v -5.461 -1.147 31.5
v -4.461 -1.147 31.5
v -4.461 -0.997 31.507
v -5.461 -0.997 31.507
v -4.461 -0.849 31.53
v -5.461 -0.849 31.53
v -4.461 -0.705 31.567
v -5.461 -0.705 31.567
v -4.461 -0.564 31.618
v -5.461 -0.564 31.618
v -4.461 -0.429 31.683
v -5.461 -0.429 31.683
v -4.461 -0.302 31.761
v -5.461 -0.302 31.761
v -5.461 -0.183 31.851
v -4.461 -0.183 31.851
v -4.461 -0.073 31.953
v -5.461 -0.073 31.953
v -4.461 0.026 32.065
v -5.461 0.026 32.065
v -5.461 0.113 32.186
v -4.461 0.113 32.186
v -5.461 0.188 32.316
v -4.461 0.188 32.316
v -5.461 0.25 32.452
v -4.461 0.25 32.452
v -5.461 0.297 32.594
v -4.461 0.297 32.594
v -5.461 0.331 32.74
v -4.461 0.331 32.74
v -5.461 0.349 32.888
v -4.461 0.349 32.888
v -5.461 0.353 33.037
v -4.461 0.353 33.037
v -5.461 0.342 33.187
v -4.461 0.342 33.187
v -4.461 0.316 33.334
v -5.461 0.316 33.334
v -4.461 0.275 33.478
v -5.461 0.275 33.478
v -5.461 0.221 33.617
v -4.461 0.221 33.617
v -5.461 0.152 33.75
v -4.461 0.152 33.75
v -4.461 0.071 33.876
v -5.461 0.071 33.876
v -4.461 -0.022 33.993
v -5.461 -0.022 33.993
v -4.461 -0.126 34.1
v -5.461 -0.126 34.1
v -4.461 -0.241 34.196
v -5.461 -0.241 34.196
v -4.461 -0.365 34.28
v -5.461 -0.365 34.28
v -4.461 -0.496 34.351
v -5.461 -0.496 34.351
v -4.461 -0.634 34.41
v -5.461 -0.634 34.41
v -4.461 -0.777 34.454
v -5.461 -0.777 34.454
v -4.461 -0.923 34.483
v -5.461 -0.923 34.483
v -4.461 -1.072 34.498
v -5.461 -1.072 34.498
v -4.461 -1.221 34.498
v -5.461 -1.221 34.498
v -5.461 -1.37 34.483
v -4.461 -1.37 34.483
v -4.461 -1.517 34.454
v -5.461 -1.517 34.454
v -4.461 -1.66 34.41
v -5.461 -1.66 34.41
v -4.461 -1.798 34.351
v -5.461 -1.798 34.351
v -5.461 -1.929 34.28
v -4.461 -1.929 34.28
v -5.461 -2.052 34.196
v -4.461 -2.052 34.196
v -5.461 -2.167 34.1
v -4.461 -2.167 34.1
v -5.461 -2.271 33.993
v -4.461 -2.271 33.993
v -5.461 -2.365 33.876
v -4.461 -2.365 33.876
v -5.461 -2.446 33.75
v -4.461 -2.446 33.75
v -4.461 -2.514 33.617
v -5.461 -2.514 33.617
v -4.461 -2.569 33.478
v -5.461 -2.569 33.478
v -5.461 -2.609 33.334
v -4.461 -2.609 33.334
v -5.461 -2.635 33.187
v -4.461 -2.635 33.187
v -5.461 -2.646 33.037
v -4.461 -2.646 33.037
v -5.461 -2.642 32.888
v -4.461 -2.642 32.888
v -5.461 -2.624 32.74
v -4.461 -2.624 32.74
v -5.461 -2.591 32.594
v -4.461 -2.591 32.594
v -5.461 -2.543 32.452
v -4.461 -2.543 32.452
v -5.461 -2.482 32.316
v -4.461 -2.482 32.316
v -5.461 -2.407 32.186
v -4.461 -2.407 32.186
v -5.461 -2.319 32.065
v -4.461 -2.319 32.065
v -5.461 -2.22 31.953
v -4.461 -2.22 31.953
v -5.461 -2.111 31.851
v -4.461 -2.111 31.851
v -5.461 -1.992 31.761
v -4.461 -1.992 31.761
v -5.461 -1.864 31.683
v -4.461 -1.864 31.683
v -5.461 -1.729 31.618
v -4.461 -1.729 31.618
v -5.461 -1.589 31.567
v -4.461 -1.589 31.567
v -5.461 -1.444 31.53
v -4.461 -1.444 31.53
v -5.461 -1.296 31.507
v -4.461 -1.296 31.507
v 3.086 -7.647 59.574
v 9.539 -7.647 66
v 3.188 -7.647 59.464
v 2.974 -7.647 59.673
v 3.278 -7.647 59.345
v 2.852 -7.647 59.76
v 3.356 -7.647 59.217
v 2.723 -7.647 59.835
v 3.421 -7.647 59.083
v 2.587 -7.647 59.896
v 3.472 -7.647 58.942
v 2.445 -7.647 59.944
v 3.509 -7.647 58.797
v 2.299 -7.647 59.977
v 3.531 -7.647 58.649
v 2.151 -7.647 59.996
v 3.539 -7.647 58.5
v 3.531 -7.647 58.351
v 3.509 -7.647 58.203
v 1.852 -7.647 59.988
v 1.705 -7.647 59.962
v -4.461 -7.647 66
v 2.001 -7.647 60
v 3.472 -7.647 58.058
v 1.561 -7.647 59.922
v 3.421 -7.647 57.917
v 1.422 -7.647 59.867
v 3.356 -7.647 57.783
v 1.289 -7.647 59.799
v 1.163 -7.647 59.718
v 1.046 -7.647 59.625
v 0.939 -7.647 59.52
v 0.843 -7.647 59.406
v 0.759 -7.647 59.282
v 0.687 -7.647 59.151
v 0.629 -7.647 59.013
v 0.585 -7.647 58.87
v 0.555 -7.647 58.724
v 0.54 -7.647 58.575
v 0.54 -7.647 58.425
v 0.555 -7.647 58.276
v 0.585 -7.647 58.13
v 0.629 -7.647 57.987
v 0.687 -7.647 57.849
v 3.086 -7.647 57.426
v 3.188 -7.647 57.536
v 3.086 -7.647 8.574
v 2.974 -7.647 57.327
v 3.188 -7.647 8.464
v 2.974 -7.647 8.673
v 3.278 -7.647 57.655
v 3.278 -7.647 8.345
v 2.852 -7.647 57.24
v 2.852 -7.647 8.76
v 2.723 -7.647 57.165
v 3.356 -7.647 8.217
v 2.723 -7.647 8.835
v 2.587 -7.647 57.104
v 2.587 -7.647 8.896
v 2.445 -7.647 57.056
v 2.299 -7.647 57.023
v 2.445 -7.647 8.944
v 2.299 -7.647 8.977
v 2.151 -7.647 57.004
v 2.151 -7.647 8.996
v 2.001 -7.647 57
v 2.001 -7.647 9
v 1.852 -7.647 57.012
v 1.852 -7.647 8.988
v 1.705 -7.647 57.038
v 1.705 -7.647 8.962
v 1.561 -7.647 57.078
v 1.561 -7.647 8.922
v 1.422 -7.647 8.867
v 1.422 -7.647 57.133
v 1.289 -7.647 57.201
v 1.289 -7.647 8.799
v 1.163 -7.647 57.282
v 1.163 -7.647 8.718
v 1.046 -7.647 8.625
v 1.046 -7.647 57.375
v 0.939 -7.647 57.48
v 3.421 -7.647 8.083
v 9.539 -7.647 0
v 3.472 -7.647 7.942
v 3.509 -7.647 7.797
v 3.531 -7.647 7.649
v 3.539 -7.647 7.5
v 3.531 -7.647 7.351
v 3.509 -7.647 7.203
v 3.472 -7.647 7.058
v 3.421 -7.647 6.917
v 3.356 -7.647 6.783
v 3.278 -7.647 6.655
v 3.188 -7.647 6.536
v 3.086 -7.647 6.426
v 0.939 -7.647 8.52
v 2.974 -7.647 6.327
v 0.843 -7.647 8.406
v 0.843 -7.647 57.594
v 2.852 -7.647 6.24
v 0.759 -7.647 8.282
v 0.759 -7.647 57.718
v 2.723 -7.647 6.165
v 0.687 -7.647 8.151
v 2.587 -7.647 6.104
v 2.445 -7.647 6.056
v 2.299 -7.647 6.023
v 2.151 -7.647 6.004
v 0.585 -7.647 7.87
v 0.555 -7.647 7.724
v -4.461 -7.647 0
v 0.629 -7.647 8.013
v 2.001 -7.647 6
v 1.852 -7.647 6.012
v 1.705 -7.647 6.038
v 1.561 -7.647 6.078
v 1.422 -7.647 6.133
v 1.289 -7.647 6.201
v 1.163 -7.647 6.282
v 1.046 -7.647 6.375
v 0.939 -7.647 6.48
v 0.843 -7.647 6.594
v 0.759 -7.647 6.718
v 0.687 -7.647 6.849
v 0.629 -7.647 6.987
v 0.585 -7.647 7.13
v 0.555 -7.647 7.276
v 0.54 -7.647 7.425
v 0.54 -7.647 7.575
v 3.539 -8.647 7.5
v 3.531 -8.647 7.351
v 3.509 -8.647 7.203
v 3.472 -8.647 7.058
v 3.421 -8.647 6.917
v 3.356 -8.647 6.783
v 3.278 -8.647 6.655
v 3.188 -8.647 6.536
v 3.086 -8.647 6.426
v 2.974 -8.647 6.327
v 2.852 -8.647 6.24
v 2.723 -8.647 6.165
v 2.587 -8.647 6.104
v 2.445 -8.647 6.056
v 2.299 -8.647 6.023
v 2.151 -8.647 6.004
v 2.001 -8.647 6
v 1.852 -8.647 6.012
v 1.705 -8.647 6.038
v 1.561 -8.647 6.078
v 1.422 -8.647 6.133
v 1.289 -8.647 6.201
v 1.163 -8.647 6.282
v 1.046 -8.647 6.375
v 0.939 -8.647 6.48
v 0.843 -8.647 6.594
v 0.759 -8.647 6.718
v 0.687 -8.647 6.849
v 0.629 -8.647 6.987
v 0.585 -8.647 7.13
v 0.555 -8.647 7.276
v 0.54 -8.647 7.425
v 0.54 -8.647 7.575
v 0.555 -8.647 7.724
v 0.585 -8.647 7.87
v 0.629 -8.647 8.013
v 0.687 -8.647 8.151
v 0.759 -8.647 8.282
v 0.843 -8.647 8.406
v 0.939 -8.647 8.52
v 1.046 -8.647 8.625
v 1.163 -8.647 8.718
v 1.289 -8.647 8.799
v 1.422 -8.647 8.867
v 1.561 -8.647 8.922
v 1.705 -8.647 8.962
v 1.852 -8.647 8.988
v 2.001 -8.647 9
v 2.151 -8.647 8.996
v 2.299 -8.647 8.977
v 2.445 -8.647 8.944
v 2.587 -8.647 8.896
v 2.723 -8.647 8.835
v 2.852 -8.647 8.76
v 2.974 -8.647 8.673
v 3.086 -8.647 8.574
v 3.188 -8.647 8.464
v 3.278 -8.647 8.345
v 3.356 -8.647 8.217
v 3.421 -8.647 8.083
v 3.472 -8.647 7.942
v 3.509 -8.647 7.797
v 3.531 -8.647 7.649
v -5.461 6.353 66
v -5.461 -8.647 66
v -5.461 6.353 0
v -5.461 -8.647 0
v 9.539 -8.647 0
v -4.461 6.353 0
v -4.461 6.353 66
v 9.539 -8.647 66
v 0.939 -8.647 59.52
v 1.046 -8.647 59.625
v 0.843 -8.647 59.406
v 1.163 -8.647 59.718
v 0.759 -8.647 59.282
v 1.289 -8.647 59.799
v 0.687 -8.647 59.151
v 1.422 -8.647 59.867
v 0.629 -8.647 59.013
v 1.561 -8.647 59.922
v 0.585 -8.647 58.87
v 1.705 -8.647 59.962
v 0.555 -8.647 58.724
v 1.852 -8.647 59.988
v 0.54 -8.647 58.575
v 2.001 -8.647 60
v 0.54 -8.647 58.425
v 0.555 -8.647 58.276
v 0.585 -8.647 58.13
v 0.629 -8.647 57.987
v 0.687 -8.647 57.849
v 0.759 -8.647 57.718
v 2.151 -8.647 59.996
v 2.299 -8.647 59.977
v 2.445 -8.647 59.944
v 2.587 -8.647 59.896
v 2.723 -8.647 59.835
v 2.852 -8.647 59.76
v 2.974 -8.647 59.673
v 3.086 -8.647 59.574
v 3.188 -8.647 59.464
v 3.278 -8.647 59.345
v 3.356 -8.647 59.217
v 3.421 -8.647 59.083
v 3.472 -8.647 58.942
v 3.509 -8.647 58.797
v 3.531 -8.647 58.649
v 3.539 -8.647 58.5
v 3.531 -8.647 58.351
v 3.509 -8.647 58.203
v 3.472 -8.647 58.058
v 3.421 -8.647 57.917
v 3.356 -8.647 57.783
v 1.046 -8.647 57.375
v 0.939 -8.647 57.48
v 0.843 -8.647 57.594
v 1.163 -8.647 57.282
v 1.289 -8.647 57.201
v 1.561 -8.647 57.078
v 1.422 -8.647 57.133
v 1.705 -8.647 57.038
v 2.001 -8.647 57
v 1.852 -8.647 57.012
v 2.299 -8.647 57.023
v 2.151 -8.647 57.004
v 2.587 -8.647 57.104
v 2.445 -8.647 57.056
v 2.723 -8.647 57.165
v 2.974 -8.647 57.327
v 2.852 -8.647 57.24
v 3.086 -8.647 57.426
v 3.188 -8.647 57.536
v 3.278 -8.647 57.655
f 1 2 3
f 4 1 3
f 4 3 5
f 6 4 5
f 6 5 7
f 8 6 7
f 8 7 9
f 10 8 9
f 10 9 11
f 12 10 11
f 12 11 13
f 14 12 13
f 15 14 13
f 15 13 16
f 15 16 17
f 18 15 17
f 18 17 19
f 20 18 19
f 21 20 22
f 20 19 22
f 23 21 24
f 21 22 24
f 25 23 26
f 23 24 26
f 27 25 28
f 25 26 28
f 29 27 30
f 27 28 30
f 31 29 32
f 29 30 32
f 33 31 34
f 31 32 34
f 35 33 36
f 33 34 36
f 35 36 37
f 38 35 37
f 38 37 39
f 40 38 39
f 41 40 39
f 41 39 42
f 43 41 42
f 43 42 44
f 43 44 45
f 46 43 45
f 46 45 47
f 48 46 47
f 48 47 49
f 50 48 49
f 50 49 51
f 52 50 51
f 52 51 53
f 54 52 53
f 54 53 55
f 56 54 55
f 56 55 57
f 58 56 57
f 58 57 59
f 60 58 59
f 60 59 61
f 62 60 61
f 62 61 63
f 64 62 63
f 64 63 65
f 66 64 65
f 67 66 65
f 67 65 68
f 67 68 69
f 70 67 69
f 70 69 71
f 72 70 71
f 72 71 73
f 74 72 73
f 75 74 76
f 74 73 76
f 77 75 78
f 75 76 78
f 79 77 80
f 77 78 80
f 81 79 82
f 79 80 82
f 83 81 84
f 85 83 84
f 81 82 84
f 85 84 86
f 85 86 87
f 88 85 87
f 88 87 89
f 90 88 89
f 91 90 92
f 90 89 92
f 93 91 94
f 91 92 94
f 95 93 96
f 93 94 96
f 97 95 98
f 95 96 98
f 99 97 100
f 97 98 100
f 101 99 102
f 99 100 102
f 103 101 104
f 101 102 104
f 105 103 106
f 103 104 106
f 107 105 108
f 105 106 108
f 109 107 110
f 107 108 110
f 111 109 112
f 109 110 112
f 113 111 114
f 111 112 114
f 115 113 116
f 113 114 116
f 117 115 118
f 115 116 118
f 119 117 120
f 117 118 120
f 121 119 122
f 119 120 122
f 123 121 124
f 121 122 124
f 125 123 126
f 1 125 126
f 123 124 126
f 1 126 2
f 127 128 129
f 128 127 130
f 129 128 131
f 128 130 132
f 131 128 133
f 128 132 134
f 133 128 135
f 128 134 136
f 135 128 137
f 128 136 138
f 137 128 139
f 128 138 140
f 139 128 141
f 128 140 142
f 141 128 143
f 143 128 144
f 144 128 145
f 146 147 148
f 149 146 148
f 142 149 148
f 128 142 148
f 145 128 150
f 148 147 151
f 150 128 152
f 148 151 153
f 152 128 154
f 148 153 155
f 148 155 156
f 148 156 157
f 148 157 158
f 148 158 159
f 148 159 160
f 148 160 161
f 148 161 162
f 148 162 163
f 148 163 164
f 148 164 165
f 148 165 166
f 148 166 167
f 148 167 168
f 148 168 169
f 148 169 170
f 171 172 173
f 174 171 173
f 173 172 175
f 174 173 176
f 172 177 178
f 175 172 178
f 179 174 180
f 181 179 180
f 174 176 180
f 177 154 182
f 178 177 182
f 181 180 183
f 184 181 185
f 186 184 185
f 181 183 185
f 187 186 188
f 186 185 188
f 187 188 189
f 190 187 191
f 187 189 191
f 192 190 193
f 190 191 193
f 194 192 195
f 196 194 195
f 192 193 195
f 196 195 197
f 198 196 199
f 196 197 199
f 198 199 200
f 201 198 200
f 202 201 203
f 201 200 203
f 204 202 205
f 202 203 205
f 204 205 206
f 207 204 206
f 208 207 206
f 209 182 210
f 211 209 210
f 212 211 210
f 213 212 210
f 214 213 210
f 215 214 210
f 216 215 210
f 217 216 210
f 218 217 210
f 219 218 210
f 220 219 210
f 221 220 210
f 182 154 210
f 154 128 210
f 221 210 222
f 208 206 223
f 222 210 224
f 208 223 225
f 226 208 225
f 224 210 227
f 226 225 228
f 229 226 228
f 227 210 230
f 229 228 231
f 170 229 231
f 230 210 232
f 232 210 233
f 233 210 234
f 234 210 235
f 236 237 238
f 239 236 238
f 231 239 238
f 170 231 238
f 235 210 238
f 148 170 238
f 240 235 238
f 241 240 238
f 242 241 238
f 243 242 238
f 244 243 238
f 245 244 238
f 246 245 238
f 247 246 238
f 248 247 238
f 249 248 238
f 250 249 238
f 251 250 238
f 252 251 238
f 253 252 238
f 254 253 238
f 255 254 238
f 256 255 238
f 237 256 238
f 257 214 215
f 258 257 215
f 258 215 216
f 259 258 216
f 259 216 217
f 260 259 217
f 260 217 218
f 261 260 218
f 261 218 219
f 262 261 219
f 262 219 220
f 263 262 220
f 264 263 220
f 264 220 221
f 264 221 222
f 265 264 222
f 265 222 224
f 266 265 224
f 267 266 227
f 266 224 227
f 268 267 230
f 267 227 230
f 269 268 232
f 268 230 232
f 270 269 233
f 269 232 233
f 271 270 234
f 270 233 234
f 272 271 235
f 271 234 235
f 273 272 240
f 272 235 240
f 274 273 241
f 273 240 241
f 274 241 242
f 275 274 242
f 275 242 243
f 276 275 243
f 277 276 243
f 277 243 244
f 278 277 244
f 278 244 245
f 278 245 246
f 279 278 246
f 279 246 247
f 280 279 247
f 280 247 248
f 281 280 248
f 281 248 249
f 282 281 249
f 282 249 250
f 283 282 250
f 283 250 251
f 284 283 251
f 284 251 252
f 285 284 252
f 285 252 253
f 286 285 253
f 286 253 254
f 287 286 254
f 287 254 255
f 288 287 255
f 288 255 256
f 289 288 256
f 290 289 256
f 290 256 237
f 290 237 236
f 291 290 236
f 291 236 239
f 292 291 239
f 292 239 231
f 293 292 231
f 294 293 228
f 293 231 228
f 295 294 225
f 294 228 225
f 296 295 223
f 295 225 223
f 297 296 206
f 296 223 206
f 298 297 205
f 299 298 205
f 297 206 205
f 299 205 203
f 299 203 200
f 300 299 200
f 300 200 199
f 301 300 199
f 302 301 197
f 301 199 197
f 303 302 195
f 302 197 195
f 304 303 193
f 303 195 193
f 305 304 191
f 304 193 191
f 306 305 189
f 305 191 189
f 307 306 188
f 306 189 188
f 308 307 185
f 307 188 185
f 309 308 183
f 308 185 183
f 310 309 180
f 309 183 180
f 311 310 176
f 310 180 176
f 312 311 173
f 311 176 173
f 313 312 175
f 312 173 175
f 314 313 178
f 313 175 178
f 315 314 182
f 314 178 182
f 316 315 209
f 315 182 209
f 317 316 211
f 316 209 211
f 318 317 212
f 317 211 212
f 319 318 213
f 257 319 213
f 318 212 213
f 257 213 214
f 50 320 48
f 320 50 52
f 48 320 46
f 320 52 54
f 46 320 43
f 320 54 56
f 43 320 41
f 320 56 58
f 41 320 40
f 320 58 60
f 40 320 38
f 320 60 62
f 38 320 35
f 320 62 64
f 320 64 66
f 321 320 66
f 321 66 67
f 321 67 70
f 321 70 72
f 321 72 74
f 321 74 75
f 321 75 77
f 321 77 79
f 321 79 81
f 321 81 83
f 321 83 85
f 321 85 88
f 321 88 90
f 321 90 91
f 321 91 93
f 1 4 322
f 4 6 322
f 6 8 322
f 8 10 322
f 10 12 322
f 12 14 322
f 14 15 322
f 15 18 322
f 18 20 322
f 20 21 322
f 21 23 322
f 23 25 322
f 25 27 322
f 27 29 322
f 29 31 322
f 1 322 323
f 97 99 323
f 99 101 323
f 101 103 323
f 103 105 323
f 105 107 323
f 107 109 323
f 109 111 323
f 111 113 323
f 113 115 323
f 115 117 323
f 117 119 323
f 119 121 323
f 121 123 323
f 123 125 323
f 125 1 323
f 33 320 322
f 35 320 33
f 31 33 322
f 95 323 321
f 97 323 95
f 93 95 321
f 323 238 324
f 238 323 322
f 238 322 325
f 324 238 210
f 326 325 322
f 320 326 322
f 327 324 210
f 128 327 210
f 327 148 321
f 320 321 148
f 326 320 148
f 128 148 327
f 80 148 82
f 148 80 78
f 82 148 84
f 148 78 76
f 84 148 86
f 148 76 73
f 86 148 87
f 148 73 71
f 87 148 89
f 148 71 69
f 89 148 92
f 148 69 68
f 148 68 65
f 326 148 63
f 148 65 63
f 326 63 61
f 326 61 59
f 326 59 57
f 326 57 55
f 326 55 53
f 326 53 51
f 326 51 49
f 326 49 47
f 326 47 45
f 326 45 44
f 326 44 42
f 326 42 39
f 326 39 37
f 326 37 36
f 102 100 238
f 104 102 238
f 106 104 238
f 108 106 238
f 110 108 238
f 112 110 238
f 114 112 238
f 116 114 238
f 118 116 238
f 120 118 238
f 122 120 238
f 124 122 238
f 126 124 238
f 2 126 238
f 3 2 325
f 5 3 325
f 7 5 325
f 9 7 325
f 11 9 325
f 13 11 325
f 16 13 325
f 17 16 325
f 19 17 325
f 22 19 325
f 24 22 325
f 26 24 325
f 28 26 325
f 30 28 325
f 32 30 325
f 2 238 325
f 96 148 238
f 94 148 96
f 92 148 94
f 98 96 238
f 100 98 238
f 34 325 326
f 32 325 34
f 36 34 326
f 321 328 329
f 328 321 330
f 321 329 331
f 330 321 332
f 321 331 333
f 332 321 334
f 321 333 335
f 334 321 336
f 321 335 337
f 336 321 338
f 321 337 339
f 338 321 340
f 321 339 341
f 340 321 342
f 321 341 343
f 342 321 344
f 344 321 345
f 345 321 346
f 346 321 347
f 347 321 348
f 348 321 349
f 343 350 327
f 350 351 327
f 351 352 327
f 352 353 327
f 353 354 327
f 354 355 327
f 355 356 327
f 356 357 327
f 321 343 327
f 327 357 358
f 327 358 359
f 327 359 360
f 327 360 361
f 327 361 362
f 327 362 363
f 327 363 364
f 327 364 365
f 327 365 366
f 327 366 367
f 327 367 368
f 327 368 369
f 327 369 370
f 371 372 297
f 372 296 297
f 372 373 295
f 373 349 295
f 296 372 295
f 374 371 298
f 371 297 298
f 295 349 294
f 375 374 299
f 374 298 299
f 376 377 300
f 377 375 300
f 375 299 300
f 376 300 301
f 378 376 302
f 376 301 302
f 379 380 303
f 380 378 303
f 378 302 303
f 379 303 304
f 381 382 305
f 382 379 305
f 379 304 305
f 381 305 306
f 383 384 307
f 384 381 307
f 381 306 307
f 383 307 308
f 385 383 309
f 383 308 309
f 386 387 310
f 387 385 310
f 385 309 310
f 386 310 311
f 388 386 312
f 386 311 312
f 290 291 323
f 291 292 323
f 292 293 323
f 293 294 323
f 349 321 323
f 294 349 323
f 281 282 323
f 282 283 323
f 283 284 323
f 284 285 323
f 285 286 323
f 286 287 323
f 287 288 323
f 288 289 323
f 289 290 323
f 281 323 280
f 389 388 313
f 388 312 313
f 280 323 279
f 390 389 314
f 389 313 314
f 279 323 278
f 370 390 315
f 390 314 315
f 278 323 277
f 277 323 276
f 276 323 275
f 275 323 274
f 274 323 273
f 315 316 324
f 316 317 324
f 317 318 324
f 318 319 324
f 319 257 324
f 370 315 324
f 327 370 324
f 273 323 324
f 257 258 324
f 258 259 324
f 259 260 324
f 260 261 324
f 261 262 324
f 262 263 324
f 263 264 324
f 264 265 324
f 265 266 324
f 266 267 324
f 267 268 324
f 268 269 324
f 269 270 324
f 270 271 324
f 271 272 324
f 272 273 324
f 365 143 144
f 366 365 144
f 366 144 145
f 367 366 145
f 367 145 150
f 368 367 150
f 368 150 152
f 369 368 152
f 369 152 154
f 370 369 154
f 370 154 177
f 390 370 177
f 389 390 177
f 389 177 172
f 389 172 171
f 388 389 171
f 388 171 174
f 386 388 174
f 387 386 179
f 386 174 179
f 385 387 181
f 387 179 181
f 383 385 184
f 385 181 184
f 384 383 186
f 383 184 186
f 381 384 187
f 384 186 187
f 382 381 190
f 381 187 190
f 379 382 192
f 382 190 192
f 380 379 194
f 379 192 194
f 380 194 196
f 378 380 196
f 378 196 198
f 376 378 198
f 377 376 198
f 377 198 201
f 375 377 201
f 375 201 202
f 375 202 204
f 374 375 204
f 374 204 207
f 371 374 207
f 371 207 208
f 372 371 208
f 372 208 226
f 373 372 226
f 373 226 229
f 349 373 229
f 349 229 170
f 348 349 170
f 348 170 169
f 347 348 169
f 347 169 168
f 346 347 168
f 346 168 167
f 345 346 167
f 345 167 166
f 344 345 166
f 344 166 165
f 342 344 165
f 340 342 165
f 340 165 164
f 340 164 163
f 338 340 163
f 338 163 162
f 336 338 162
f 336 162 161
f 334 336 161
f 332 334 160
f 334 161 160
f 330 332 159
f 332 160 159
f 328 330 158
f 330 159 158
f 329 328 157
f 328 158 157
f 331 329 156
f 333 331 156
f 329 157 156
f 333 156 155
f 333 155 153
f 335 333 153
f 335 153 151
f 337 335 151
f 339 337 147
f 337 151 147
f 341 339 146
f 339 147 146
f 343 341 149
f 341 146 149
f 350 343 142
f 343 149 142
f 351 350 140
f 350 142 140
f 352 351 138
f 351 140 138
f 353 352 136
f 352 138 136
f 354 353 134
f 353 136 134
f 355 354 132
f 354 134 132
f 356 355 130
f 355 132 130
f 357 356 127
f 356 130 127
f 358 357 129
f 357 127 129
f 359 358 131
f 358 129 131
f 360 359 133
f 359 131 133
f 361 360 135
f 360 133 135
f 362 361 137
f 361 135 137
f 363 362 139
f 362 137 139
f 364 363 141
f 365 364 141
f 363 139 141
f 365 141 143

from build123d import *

# Parameters (mm, degrees)
EXTRUDE_1_DEPTH     = 66
SKETCH_3_R          = 1.5
CUT_EXTRUDE_1_DEPTH = 10
SKETCH_4_R          = 1.5
CUT_EXTRUDE_2_DEPTH = 10
SKETCH_5_R          = 1.5
CUT_EXTRUDE_3_DEPTH = 10


with BuildPart() as part:
    # ｽｹｯﾁ1 → ﾎﾞｽ - 押し出し1 (new body)
    with BuildSketch(Plane.XY):
        Polygon((-4.461455774, 6.353305785), (-5.461455774, 6.353305785), (-5.461455774, -8.646694215), (9.538544226, -8.646694215), (9.538544226, -7.646694215), (-4.461455774, -7.646694215), align=None)
    extrude(amount=EXTRUDE_1_DEPTH)

    # ｽｹｯﾁ3 → ｶｯﾄ - 押し出し1 (cut)
    with BuildSketch(Plane(origin=(-4.461455774, 0, 0), x_dir=(0, 0, -1), z_dir=(1, 0, 0))):
        with Locations((-33, -1.146694215)):
            Circle(SKETCH_3_R)
    extrude(amount=-CUT_EXTRUDE_1_DEPTH, mode=Mode.SUBTRACT)

    # ｽｹｯﾁ4 → ｶｯﾄ - 押し出し2 (cut)
    with BuildSketch(Plane(origin=(0, -7.646694215, 0), x_dir=(1, 0, 0), z_dir=(0, 1, 0))):
        with Locations((2.038544226, -7.5)):
            Circle(SKETCH_4_R)
    extrude(amount=-CUT_EXTRUDE_2_DEPTH, mode=Mode.SUBTRACT)

    # ｽｹｯﾁ5 → ｶｯﾄ - 押し出し3 (cut)
    with BuildSketch(Plane(origin=(0, -7.646694215, 0), x_dir=(1, 0, 0), z_dir=(0, 1, 0))):
        with Locations((2.038544226, -58.5)):
            Circle(SKETCH_5_R)
    extrude(amount=-CUT_EXTRUDE_3_DEPTH, mode=Mode.SUBTRACT)


solid = part.part
